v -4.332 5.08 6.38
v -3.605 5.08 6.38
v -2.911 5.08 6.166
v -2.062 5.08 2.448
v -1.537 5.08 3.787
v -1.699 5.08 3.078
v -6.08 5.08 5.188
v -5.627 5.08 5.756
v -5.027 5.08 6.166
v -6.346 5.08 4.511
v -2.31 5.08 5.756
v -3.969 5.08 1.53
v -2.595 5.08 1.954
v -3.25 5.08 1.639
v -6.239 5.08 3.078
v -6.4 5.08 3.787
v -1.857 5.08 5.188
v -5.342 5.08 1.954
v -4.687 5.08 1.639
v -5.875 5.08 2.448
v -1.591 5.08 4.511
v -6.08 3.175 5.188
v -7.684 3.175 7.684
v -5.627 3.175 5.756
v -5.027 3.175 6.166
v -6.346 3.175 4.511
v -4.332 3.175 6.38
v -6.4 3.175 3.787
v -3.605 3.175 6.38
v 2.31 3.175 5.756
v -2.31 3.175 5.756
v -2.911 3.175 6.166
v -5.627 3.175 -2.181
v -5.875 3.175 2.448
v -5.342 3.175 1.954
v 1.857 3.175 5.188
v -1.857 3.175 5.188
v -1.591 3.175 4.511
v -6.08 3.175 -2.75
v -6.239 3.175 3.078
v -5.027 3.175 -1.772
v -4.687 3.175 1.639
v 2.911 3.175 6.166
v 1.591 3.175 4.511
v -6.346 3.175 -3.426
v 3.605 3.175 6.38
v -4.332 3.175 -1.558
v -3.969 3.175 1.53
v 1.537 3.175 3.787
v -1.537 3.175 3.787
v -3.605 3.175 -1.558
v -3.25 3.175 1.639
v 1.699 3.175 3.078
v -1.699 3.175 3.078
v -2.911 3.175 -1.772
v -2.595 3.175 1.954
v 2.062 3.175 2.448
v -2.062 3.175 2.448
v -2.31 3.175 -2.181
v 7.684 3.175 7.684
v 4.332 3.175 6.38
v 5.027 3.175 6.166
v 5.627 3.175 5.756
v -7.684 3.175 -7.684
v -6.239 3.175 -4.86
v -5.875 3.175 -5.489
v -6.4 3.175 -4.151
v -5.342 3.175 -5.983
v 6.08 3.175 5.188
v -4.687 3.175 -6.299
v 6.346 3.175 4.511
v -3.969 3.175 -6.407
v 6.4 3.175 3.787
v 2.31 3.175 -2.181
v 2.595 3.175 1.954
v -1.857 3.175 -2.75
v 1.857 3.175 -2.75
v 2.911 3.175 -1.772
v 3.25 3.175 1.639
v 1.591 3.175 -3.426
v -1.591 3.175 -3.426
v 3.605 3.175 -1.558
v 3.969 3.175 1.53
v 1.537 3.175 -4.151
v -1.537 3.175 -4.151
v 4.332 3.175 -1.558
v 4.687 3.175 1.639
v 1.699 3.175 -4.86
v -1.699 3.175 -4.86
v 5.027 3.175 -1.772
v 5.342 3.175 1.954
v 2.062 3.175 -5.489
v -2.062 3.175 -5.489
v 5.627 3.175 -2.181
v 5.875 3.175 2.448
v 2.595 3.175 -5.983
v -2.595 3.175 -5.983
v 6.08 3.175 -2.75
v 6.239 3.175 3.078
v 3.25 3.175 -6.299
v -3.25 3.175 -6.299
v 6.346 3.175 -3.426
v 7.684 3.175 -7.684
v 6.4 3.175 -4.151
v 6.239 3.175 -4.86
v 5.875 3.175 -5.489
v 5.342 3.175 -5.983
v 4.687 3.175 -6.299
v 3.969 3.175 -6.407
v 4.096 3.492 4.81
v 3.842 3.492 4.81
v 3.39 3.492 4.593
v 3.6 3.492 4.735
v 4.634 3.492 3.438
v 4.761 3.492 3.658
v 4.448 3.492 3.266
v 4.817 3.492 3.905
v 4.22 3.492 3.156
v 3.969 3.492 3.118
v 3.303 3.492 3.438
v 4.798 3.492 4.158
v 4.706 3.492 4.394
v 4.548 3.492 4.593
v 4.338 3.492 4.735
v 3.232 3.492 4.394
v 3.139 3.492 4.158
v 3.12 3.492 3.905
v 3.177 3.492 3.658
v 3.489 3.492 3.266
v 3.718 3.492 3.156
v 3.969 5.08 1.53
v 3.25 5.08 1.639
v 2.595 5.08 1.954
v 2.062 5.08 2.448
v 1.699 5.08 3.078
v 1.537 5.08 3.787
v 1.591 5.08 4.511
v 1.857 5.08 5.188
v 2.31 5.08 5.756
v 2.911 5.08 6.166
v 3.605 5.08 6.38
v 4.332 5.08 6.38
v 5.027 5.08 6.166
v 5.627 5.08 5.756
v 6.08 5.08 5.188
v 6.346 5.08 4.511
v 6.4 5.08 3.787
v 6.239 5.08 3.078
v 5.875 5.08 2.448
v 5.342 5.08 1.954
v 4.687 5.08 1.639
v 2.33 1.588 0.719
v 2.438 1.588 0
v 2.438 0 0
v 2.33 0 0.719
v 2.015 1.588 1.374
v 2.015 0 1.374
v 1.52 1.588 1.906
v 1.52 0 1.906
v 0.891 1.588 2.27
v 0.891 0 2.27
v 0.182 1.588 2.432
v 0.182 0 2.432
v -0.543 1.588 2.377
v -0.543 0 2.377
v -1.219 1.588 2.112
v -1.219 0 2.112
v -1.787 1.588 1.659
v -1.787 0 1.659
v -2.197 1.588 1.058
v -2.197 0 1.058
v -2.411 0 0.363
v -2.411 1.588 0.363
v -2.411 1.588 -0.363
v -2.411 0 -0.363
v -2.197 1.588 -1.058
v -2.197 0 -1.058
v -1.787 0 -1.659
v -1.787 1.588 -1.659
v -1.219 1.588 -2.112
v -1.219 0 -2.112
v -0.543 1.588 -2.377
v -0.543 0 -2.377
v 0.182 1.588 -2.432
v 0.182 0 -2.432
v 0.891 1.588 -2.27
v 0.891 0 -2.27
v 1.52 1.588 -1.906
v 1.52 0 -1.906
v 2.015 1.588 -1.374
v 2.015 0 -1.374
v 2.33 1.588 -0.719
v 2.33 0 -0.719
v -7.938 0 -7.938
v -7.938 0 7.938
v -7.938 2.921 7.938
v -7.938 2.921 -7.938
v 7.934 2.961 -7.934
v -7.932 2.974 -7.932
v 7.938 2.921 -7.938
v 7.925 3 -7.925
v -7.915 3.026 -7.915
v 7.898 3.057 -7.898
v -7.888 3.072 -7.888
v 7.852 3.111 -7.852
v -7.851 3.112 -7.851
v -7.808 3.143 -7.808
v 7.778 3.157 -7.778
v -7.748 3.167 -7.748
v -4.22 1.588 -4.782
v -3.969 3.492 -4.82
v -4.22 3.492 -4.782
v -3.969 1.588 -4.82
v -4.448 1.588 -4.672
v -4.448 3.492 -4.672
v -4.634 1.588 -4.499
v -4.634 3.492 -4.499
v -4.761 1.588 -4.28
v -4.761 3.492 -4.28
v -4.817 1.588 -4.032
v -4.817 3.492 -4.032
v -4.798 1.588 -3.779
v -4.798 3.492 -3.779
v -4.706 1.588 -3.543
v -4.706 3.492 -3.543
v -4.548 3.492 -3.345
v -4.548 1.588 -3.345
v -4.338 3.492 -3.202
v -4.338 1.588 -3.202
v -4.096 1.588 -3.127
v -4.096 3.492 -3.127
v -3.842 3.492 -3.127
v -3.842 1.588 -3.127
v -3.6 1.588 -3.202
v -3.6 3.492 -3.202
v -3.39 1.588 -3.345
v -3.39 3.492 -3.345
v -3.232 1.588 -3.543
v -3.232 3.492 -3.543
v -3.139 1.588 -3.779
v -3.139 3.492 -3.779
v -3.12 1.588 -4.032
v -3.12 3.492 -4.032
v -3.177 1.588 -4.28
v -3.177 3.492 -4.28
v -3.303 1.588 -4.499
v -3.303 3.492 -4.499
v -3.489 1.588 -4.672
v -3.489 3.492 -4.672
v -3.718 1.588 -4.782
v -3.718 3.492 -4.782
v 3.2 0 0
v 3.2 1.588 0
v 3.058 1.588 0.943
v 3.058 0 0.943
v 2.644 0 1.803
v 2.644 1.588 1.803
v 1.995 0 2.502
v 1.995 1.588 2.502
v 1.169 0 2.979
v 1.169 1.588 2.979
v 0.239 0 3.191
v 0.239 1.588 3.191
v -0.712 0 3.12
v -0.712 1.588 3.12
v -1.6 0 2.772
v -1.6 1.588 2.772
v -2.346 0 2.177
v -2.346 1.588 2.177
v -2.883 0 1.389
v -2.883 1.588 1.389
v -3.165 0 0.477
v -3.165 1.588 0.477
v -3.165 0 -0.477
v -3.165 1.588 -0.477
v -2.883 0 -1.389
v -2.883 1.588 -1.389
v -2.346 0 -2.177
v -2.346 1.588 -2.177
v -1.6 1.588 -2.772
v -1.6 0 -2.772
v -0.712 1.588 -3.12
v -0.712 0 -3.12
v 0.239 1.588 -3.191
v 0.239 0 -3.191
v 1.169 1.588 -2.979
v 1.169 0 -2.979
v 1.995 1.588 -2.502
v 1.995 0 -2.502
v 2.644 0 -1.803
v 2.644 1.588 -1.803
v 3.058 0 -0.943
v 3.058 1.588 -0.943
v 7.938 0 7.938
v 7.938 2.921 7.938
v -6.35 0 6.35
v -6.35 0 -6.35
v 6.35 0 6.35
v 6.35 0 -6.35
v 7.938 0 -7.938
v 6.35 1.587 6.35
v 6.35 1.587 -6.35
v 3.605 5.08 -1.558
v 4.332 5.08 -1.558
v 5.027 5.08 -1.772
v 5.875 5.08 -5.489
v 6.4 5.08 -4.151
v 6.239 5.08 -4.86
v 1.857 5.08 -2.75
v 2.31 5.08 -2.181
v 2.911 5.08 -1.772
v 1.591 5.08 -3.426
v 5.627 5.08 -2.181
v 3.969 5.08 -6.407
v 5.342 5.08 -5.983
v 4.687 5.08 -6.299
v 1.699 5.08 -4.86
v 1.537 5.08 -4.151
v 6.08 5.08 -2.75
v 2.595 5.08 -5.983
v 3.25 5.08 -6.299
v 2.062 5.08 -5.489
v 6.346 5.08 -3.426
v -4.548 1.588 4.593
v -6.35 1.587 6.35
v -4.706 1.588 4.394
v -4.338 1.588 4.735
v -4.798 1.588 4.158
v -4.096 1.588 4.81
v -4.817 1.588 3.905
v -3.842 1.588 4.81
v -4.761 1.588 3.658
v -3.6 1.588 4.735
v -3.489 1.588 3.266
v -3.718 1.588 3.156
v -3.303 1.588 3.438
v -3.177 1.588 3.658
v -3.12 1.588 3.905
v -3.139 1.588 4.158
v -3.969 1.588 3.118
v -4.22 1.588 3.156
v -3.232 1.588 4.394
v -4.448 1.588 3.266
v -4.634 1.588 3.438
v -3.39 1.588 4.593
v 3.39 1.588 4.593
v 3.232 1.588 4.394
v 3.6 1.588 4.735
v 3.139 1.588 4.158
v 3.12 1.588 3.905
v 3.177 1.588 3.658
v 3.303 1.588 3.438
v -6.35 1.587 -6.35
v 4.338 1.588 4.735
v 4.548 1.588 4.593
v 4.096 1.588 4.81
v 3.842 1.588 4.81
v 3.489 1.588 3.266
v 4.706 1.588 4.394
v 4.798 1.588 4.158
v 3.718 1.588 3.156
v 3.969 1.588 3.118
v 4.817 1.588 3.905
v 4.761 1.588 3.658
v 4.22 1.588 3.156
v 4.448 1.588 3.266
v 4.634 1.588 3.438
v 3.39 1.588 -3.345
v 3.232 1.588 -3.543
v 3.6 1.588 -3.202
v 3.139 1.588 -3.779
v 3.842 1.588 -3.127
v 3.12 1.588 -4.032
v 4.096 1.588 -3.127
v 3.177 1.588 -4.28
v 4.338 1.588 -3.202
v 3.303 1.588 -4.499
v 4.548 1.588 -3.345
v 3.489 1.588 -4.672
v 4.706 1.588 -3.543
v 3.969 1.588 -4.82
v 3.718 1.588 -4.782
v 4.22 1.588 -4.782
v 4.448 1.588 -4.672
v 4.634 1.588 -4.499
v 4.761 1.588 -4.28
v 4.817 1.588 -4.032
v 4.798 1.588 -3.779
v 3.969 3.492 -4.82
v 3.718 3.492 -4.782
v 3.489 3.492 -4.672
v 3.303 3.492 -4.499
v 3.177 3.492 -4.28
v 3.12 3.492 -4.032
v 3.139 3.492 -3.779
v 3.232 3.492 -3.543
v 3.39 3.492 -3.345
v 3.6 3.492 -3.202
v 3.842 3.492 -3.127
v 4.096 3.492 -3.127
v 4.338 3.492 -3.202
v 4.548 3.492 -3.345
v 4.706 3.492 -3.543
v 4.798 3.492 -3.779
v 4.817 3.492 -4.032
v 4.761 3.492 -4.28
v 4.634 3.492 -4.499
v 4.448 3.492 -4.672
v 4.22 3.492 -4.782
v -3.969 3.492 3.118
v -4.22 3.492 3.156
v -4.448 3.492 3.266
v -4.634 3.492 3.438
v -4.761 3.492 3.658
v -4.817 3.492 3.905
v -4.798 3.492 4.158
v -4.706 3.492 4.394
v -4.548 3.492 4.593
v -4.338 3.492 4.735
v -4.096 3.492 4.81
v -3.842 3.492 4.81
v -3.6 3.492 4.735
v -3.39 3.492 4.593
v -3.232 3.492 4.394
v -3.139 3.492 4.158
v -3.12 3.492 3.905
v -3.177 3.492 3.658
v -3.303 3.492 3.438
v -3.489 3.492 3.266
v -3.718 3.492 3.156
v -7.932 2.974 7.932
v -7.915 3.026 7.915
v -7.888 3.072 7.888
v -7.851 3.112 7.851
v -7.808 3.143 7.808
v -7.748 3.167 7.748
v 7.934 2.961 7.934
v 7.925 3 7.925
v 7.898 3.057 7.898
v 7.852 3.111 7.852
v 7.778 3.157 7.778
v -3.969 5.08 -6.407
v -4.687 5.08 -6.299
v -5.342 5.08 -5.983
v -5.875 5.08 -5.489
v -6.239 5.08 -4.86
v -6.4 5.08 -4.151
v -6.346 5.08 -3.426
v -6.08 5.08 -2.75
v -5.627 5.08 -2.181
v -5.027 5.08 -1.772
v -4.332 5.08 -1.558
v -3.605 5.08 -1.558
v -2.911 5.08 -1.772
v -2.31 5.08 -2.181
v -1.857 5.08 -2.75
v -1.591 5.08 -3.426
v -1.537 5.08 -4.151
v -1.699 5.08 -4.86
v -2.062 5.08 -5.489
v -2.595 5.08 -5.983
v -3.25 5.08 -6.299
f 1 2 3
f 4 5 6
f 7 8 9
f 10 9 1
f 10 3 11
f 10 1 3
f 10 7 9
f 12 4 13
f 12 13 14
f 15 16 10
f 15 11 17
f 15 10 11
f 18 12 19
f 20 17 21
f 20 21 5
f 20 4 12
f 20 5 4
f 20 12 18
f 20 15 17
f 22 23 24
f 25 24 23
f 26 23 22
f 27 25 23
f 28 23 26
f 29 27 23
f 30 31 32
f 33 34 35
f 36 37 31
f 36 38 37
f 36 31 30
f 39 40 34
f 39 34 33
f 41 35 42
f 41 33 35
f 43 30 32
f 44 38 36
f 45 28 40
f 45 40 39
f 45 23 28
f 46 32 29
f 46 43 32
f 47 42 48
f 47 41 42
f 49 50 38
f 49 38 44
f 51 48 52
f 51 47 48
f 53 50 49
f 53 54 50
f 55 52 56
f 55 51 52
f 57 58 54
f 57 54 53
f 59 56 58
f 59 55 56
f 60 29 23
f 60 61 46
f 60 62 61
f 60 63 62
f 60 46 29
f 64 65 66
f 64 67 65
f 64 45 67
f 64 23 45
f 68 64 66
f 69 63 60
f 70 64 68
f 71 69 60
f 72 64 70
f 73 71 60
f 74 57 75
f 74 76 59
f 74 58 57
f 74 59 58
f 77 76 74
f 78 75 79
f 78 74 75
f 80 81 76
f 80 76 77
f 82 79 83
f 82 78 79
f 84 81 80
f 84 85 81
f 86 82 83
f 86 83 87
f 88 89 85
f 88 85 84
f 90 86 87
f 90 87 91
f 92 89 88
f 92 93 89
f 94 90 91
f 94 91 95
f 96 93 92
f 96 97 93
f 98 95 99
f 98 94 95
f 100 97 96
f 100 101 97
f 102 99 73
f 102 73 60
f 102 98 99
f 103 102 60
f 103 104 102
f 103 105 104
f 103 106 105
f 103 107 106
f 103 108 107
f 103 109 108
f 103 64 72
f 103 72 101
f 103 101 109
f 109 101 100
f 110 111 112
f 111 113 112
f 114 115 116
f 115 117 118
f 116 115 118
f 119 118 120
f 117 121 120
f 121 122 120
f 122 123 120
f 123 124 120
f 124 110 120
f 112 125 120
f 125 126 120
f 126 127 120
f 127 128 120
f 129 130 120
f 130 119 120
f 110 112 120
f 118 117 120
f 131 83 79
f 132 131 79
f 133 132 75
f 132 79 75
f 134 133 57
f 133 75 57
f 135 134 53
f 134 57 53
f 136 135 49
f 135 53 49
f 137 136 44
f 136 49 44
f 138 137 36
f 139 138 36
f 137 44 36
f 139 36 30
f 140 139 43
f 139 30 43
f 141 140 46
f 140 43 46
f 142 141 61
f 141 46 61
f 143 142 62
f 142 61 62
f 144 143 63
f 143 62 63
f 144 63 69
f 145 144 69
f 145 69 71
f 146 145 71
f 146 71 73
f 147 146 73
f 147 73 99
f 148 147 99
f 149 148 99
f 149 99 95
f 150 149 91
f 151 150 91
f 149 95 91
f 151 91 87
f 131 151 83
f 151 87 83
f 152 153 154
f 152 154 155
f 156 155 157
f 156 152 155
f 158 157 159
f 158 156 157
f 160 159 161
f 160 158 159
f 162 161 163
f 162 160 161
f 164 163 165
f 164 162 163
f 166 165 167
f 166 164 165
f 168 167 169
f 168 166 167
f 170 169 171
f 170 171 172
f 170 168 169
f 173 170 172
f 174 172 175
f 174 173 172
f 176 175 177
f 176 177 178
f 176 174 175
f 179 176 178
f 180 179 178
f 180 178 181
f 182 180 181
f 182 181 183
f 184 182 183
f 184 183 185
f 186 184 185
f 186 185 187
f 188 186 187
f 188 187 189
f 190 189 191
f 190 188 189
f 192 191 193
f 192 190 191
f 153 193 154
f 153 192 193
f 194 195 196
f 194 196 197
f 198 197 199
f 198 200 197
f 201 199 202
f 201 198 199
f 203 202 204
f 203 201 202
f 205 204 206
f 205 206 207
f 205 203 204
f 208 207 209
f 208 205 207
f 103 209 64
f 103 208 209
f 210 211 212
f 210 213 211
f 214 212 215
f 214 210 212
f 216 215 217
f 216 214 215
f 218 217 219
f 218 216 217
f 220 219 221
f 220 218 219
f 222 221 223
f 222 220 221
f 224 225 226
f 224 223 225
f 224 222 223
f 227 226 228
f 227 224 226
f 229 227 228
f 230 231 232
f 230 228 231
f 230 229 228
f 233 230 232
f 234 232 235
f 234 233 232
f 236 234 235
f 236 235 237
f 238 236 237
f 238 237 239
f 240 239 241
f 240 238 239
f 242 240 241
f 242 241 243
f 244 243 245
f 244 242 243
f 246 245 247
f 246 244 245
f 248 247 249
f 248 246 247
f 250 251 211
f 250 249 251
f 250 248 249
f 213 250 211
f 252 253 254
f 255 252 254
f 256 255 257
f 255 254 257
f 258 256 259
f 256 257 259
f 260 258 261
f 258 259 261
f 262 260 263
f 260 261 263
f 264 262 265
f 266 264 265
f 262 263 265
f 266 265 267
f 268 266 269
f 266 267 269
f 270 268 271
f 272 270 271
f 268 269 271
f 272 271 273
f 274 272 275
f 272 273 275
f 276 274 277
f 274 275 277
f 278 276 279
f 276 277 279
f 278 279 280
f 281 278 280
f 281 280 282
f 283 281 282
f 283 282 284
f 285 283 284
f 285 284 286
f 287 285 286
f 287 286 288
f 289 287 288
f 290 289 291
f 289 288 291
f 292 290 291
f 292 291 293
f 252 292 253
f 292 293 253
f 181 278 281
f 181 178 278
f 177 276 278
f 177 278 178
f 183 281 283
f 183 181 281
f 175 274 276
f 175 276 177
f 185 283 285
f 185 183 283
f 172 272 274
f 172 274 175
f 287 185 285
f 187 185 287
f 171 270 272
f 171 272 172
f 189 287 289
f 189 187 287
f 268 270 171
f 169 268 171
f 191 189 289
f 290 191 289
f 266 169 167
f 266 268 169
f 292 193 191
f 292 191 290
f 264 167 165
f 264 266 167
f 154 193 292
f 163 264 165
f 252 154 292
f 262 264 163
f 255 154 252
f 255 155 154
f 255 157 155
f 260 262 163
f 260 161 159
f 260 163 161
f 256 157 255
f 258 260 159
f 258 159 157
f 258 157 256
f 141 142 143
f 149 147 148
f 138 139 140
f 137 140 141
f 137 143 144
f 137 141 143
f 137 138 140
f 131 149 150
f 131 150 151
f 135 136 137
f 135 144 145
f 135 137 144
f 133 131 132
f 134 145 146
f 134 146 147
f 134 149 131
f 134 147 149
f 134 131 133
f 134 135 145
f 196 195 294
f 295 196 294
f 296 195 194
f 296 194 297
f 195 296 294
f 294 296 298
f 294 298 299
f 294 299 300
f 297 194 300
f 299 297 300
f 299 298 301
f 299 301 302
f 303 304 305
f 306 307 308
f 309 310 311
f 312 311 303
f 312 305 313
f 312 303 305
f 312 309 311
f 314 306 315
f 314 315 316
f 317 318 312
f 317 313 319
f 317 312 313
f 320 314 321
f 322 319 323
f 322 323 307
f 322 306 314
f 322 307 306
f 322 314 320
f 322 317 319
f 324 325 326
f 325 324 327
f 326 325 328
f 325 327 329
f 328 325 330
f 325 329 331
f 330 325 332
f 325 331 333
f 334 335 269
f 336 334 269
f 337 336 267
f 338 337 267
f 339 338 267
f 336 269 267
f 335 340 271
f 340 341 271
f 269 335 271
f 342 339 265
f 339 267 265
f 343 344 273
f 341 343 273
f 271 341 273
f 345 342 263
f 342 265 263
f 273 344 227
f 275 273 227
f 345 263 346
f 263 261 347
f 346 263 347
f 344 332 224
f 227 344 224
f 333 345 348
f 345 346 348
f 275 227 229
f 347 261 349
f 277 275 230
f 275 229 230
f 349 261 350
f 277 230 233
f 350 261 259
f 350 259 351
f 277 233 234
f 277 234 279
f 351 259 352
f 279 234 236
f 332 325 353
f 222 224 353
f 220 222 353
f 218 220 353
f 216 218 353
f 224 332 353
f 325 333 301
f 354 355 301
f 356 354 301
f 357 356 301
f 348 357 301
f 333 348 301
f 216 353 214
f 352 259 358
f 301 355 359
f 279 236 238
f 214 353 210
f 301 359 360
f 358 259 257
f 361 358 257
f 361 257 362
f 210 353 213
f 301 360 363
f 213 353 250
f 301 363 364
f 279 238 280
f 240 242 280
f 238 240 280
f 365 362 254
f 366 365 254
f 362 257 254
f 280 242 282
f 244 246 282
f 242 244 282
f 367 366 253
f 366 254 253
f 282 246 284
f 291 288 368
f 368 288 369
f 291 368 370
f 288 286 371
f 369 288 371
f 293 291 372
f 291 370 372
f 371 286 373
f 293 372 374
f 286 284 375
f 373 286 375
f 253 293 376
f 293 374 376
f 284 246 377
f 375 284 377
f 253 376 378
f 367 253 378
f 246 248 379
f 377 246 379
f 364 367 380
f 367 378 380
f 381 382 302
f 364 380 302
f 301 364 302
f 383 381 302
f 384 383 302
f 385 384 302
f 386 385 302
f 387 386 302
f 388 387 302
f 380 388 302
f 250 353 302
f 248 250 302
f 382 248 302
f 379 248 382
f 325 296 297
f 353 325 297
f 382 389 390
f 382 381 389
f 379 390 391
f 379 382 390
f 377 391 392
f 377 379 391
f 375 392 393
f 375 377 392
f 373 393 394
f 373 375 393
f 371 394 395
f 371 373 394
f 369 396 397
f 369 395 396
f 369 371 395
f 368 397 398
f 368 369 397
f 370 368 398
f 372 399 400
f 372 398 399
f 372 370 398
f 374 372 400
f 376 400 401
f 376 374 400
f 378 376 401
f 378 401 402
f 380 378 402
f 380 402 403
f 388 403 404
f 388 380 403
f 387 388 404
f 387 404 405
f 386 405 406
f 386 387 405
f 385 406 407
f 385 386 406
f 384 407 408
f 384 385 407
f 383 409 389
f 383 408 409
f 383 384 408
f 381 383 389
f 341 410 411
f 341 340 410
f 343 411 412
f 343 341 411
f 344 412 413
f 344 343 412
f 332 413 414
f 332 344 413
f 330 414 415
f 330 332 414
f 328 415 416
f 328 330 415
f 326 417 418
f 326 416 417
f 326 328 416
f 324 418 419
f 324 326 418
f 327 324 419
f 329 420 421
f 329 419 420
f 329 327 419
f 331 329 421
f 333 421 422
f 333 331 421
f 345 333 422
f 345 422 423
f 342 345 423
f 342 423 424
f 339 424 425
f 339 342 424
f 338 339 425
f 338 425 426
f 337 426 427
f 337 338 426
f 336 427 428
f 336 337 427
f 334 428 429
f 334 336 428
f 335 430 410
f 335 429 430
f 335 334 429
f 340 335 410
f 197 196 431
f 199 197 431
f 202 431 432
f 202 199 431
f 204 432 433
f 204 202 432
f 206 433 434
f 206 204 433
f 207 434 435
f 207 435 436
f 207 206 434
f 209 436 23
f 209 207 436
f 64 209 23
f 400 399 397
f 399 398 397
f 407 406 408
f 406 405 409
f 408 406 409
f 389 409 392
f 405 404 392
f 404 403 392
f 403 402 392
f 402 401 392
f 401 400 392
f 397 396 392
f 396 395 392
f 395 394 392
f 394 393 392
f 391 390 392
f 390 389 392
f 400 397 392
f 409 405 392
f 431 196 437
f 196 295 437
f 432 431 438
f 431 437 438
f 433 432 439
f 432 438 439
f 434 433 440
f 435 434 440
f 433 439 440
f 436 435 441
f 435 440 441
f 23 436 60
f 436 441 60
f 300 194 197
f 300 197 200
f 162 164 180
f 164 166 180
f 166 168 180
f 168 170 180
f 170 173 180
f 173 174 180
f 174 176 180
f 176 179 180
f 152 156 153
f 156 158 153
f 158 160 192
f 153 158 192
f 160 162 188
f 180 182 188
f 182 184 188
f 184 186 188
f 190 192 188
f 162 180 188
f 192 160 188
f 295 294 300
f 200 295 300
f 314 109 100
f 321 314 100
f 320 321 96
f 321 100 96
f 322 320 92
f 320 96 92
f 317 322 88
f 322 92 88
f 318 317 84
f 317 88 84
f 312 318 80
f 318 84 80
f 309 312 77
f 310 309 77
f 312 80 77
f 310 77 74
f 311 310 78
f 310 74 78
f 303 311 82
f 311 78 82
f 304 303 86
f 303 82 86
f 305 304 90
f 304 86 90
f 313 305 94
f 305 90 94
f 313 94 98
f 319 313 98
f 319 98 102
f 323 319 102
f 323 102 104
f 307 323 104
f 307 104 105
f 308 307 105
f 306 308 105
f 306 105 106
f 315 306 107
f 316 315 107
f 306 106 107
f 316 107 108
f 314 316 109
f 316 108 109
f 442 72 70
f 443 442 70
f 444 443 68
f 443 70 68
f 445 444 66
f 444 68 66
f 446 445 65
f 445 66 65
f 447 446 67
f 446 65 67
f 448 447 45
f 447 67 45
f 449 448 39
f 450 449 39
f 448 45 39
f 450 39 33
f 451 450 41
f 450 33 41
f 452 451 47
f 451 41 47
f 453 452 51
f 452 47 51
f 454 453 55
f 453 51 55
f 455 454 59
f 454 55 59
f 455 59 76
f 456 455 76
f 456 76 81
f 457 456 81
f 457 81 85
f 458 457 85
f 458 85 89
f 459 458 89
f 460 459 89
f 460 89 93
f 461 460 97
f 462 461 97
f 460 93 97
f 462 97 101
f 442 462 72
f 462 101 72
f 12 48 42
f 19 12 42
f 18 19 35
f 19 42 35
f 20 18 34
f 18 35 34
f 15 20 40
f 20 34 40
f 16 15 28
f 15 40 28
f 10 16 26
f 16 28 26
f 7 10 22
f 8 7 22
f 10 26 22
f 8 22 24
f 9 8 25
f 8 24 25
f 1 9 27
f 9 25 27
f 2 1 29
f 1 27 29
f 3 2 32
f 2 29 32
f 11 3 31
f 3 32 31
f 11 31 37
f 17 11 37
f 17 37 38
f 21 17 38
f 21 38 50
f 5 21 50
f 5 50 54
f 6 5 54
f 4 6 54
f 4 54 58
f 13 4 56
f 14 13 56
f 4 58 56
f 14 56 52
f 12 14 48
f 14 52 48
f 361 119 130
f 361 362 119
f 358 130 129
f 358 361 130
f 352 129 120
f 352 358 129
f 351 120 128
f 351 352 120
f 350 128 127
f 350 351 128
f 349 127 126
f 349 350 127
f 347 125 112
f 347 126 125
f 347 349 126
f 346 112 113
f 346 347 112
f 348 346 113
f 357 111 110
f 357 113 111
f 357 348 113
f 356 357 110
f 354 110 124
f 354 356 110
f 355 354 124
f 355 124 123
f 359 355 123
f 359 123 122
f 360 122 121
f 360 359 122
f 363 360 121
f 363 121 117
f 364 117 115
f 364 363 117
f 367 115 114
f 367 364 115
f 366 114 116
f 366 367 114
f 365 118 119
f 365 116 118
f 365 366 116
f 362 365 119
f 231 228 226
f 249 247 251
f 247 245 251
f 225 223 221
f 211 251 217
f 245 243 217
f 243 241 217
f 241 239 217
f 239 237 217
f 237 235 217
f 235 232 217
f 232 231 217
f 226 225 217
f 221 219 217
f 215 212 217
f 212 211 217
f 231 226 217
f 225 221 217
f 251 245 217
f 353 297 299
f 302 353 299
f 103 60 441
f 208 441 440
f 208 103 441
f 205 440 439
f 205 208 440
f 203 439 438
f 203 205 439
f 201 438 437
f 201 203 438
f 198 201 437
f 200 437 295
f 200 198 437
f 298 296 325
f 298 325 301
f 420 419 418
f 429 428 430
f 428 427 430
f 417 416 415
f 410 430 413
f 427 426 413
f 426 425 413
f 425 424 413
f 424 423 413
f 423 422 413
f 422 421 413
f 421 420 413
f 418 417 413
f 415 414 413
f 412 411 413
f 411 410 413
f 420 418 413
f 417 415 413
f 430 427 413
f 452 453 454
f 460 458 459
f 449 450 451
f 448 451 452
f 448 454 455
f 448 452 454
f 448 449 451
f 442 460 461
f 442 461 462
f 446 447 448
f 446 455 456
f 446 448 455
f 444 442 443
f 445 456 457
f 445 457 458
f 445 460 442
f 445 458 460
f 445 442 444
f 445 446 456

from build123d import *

# Parameters (mm, degrees)
SKETCH1_W            = 15.875
SKETCH1_H            = 15.875
BASE_EXTRUDE_DEPTH   = 3.175
SKETCH2_R            = 2.4384
BOSS_EXTRUDE1_DEPTH  = 1.905
LPATTERN4_COUNT      = 2
LPATTERN4_PITCH      = 7.9375
LPATTERN4_COUNT_DIR2 = 2
LPATTERN4_PITCH_DIR2 = 7.9375
SHELL1_T             = -1.5875
SKETCH3_R            = 3.2004
SKETCH3_R_2          = 2.4384
INSDOT_DEPTH         = 1.5875
FILLET1_R            = 0.254


with BuildPart() as part:
    # Sketch1 → Base-Extrude (new body)
    with BuildSketch(Plane(origin=(0, 0, 0), x_dir=(1, 0, 0), z_dir=(0, 1, 0))):
        Rectangle(SKETCH1_W, SKETCH1_H)
    extrude(amount=BASE_EXTRUDE_DEPTH)

    # Sketch2 → Boss-Extrude1 (add)
    with BuildSketch(Plane(origin=(0, 3.175, 0), x_dir=(-1, 0, 0), z_dir=(0, 1, 0))):
        with Locations(Location((3.96875, 3.96875, 0), (0, 0, 270))):
            Circle(SKETCH2_R)
    boss_extrude1 = extrude(amount=BOSS_EXTRUDE1_DEPTH)

    # LPattern4: Boss-Extrude1 2 × 2
    with Locations(*[(i * LPATTERN4_PITCH, 0, -j * LPATTERN4_PITCH_DIR2) for i in range(LPATTERN4_COUNT) for j in range(LPATTERN4_COUNT_DIR2) if (i, j) != (0, 0)]):
        add(boss_extrude1)

    # Shell1
    shell1_openings = [part.faces().sort_by_distance(p)[0] for p in [
        (0, 0, 0),
    ]]
    offset(amount=SHELL1_T, openings=shell1_openings, kind=Kind.INTERSECTION)

    # Sketch3 → InsDot (add)
    with BuildSketch(Plane.XZ.offset(-1.5875)):
        Circle(SKETCH3_R)
        Circle(SKETCH3_R_2, mode=Mode.SUBTRACT)
    extrude(amount=INSDOT_DEPTH)

    # Fillet1
    fillet1_edges = [part.edges().sort_by_distance(p)[0] for p in [
        (7.9375, 3.175, 0),
        (0, 3.175, -7.9375),
        (-7.9375, 3.175, 0),
        (0, 3.175, 7.9375),
    ]]
    fillet(fillet1_edges, radius=FILLET1_R)


solid = part.part
